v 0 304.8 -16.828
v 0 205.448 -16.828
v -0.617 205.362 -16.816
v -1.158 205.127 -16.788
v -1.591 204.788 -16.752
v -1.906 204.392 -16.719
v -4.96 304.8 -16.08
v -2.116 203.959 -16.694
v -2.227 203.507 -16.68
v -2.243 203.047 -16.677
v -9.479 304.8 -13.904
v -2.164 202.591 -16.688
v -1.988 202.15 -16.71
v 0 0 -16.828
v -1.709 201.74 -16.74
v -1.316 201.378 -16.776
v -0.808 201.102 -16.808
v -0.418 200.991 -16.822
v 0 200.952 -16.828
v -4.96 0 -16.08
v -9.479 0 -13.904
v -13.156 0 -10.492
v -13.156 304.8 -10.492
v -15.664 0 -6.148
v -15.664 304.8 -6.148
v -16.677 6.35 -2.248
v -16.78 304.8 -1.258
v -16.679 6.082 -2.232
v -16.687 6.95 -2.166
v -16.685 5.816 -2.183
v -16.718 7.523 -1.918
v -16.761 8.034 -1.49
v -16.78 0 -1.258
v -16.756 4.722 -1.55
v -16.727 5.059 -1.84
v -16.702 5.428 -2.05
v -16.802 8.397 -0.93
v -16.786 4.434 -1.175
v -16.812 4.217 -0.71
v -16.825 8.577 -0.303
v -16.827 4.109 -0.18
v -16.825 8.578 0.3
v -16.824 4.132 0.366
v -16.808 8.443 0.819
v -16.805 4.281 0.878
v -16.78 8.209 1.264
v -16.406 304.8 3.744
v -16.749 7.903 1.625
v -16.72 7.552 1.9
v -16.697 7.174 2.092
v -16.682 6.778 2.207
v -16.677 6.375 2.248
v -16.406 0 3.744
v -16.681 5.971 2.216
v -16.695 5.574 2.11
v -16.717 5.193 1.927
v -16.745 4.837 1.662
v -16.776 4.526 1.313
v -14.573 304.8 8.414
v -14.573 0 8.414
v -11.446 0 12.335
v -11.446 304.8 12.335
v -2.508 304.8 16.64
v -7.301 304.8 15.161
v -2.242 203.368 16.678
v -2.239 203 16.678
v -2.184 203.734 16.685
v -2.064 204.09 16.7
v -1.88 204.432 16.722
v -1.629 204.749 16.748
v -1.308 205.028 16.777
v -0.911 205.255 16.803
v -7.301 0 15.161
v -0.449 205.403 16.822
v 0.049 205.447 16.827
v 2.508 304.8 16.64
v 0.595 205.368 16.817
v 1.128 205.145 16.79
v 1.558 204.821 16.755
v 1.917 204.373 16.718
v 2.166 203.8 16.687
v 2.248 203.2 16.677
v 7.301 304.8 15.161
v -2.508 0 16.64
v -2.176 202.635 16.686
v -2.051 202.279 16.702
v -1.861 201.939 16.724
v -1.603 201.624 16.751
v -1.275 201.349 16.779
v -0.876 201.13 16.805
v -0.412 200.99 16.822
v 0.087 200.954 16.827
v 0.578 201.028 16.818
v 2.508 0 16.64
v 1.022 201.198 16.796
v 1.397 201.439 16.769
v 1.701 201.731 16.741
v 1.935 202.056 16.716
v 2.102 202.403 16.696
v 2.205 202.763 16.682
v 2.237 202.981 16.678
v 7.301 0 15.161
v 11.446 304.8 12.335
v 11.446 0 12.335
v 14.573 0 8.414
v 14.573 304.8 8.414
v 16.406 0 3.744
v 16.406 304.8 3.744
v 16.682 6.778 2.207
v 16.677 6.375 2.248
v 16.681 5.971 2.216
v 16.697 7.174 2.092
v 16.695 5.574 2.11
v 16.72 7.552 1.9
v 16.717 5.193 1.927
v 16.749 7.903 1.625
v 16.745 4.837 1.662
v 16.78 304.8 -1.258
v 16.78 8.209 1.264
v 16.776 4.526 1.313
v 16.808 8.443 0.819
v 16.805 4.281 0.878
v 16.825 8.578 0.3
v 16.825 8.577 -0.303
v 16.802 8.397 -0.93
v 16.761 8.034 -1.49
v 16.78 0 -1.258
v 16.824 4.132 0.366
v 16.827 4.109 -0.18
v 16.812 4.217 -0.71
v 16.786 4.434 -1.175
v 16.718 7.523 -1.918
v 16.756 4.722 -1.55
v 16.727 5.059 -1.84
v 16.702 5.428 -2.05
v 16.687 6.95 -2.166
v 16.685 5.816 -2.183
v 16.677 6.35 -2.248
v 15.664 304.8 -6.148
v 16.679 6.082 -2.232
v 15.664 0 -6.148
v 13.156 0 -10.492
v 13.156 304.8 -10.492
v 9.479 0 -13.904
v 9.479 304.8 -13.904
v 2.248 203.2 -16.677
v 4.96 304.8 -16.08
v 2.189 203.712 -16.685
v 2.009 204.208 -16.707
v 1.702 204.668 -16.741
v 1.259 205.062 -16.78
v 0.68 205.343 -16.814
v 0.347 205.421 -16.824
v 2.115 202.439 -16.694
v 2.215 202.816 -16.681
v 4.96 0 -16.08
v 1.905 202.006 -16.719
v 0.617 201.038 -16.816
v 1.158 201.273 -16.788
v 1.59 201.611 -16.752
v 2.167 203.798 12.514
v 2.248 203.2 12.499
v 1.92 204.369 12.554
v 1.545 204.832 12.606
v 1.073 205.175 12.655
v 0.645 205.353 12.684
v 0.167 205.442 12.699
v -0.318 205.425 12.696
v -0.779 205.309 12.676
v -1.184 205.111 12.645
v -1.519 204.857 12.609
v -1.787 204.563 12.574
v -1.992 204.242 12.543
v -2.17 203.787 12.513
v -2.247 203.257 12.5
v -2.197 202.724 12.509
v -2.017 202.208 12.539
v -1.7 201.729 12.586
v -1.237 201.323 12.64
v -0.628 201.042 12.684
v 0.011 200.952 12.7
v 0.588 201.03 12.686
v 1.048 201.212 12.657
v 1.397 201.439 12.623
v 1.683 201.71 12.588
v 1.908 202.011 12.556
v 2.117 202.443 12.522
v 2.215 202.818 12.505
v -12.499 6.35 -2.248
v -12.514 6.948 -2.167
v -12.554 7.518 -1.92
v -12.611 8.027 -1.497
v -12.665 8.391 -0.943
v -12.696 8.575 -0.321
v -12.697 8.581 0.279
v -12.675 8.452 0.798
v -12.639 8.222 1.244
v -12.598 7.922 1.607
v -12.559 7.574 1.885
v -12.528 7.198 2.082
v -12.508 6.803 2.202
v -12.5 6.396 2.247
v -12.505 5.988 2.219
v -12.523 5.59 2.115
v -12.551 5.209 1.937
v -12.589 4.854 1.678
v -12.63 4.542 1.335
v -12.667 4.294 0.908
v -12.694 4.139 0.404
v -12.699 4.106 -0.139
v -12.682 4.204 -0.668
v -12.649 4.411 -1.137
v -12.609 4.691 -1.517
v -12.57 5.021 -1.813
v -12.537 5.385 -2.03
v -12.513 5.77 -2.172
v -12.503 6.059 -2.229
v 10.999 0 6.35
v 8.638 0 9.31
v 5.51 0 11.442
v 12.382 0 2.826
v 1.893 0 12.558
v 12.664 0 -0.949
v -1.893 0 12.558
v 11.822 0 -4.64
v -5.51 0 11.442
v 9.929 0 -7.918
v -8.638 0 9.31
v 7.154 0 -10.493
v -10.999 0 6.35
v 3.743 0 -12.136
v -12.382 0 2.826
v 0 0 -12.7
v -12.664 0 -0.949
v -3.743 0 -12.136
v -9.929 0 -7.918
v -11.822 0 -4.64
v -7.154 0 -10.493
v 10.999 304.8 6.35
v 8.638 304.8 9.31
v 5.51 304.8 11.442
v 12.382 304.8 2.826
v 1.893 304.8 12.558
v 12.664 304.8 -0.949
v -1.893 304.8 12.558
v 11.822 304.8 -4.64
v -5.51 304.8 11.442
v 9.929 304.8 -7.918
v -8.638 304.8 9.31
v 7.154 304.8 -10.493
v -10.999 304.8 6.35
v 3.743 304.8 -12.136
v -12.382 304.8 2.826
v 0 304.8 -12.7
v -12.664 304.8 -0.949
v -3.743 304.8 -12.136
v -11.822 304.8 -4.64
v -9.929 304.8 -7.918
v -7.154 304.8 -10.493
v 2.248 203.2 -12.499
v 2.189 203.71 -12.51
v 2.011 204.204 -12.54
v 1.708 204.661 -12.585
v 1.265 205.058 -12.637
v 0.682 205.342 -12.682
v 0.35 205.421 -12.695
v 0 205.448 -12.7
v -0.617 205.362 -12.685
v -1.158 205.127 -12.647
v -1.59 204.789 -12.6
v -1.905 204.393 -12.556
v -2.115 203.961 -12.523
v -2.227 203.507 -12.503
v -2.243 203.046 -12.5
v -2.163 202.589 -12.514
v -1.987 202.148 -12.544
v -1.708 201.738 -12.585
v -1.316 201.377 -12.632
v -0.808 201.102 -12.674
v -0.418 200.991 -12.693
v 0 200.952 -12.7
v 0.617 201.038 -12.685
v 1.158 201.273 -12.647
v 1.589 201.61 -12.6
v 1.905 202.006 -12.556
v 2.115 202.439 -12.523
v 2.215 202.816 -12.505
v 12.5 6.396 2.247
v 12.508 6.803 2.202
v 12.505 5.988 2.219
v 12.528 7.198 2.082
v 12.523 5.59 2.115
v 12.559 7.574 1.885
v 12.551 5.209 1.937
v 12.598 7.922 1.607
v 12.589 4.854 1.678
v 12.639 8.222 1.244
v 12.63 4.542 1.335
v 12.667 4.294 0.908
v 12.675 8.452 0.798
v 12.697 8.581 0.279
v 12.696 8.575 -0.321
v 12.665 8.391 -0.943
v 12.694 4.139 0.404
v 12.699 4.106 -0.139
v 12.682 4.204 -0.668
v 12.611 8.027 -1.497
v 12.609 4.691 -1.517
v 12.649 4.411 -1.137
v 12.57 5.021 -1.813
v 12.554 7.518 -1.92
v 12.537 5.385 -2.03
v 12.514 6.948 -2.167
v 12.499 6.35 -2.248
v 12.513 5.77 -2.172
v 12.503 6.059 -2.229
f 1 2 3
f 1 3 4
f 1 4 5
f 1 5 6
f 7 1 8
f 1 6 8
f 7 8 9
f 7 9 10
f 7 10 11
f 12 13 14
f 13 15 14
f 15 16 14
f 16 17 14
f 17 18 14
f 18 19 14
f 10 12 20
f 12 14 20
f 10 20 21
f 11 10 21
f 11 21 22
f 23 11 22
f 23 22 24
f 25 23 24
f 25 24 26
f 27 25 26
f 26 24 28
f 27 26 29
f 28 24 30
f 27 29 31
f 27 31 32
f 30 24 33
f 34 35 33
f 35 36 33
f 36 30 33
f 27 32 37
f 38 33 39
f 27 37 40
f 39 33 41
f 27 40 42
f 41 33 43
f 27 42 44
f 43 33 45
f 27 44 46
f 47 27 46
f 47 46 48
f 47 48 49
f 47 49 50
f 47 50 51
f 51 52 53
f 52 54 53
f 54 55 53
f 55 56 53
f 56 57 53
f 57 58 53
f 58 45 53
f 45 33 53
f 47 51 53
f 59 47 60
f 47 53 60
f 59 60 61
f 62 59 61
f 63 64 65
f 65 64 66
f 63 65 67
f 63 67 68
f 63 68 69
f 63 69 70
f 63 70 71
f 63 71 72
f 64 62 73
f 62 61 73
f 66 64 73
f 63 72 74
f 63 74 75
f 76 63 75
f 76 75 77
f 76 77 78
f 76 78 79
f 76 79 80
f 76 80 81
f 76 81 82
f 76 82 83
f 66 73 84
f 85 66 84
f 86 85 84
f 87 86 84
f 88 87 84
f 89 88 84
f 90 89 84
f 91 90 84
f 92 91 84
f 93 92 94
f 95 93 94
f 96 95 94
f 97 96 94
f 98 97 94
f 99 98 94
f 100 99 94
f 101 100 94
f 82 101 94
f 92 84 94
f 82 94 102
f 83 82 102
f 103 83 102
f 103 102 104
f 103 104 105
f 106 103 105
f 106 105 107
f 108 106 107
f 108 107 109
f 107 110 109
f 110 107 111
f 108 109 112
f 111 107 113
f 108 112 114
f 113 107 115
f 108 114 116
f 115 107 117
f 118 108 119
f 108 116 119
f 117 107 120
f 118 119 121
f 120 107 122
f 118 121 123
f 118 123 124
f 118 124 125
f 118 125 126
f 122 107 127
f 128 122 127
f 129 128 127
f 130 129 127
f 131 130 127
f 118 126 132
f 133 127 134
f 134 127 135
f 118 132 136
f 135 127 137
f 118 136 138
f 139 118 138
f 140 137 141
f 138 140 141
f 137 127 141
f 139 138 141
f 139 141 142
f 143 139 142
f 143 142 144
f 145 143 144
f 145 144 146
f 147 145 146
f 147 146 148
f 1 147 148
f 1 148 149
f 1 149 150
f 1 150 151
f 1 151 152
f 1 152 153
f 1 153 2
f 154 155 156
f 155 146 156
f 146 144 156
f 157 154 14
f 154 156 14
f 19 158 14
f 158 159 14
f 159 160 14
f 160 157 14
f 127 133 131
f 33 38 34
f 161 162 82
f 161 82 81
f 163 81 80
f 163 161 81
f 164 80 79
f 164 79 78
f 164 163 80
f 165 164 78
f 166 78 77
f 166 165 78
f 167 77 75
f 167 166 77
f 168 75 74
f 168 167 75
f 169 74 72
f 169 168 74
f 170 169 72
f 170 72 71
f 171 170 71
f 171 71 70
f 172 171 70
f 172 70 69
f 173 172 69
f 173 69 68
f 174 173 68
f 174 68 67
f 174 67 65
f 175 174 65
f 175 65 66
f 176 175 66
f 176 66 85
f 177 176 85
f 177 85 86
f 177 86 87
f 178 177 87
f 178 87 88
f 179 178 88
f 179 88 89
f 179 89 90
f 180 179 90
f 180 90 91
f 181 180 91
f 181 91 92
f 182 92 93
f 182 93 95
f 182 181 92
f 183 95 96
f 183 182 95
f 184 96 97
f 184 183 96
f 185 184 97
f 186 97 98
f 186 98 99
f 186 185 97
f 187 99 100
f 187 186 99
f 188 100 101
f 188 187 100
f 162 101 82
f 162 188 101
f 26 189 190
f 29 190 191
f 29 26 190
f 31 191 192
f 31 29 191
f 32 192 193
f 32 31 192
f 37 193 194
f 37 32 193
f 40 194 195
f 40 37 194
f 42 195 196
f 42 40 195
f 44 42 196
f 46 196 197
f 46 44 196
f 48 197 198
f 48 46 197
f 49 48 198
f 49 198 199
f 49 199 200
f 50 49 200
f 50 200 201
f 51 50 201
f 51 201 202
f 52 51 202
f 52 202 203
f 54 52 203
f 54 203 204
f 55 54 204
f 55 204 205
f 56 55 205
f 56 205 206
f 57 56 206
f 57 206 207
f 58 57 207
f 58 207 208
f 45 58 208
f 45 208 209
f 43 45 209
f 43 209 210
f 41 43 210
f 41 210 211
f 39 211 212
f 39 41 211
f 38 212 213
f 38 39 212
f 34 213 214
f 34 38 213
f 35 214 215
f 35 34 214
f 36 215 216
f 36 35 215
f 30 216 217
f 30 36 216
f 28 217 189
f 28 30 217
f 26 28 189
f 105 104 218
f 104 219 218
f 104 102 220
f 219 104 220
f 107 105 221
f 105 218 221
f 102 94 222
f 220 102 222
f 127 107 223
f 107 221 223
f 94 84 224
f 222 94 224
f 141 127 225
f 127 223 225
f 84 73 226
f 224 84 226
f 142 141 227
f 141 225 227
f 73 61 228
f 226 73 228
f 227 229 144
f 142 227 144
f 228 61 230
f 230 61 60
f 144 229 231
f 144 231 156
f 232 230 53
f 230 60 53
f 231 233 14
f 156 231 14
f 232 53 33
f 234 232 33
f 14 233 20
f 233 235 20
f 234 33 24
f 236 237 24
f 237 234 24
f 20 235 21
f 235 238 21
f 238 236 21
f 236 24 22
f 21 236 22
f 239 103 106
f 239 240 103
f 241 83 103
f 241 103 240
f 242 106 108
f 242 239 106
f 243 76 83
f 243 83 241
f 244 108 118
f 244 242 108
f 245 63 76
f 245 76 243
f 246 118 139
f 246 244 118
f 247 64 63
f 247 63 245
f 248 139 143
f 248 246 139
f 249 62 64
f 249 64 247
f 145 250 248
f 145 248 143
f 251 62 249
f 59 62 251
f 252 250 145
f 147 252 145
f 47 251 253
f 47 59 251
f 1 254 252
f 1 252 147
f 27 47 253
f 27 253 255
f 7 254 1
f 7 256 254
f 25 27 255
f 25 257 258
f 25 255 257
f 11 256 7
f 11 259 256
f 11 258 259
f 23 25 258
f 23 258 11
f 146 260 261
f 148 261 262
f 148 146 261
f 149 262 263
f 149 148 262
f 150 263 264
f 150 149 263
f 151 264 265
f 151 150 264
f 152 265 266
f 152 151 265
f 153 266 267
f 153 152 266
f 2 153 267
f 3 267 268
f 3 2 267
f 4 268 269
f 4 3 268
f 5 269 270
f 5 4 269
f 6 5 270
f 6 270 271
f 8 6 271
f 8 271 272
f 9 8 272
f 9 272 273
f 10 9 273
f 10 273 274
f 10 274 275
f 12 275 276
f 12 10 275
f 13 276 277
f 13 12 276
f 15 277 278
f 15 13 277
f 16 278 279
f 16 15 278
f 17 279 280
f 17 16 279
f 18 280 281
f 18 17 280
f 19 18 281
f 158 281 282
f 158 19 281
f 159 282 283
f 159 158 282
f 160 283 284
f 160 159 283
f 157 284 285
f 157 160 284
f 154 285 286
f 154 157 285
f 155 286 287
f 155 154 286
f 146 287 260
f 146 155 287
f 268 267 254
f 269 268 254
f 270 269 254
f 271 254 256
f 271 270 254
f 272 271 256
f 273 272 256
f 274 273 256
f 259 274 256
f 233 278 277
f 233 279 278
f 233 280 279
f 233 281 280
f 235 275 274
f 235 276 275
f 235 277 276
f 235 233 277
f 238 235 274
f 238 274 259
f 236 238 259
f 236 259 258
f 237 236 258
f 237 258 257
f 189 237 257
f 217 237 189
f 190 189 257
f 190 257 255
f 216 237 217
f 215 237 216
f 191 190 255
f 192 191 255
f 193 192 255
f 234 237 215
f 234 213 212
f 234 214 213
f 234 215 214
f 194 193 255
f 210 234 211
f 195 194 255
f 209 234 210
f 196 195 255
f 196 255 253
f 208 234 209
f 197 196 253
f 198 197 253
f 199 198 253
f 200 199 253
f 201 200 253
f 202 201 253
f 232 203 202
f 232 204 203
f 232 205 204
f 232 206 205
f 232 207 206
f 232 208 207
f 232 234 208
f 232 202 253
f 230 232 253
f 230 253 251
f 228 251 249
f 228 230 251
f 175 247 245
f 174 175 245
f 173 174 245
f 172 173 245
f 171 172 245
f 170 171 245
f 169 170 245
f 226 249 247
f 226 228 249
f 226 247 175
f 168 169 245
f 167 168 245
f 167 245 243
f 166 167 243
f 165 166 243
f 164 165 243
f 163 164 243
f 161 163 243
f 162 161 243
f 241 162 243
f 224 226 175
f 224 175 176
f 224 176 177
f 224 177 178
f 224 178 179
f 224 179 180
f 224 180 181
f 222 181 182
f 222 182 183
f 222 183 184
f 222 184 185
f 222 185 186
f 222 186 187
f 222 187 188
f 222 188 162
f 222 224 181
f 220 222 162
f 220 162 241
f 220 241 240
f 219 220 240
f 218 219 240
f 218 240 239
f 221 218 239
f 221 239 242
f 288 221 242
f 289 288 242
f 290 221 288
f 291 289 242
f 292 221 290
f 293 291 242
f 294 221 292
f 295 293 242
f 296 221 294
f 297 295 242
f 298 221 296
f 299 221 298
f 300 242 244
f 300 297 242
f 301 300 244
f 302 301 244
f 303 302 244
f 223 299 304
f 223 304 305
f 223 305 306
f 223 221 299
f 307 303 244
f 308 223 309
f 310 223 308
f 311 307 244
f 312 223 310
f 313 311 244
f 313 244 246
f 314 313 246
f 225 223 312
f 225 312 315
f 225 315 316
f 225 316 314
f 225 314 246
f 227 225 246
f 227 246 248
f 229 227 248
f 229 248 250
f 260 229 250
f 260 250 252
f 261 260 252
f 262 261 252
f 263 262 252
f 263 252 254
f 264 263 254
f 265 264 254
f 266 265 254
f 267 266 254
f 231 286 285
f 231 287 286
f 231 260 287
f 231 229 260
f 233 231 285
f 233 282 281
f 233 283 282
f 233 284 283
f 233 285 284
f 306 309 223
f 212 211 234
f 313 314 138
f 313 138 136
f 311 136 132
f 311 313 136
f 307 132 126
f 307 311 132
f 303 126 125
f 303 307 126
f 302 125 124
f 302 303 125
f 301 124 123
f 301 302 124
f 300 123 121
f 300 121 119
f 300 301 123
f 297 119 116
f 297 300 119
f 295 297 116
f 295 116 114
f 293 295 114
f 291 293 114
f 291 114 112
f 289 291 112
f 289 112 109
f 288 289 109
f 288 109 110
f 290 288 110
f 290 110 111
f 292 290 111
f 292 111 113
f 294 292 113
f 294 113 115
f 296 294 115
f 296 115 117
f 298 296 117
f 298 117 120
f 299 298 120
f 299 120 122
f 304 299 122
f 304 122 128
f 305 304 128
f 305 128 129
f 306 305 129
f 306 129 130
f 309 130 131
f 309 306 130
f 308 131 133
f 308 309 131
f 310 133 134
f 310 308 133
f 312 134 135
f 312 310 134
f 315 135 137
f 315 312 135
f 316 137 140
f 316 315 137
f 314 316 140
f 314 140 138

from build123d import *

# Parameters (mm, degrees)
SKETCH1_R               = 16.8275
SKETCH1_R_2             = 12.7
BOSS_EXTRUDE1_DEPTH     = 304.8
CUT_EXTRUDE1_DEPTH      = 306.727606723
CUT_EXTRUDE1_DEPTH_BACK = 306.727606723
SKETCH2_R               = 2.2479
CUT_EXTRUDE2_DEPTH      = 306.727606834
CUT_EXTRUDE2_DEPTH_BACK = 306.727606834
SKETCH3_R               = 2.2479


with BuildPart() as part:
    # Sketch1 → Boss-Extrude1 (new body)
    with BuildSketch(Plane(origin=(0, 0, 0), x_dir=(1, 0, 0), z_dir=(0, 1, 0))):
        with Locations(Location((0, 0, 0), (0, 0, 90))):
            Circle(SKETCH1_R)
        with Locations(Location((0, 0, 0), (0, 0, 90))):
            Circle(SKETCH1_R_2, mode=Mode.SUBTRACT)
    extrude(amount=BOSS_EXTRUDE1_DEPTH)

    # Sketch2 → Cut-Extrude1 (cut, two sides: drawn at the far end of the back side and taken through both)
    with BuildSketch(Plane.XY.offset(-CUT_EXTRUDE1_DEPTH_BACK)):
        with Locations((0, 203.2)):
            Circle(SKETCH2_R)
    extrude(amount=CUT_EXTRUDE1_DEPTH + CUT_EXTRUDE1_DEPTH_BACK, mode=Mode.SUBTRACT)

    # Sketch3 → Cut-Extrude2 (cut, two sides: drawn at the far end of the back side and taken through both)
    with BuildSketch(Plane(origin=(0, 0, 0), x_dir=(0, 0, -1), z_dir=(1, 0, 0)).offset(-CUT_EXTRUDE2_DEPTH_BACK)):
        with Locations((0, 6.35)):
            Circle(SKETCH3_R)
    extrude(amount=CUT_EXTRUDE2_DEPTH + CUT_EXTRUDE2_DEPTH_BACK, mode=Mode.SUBTRACT)


solid = part.part
